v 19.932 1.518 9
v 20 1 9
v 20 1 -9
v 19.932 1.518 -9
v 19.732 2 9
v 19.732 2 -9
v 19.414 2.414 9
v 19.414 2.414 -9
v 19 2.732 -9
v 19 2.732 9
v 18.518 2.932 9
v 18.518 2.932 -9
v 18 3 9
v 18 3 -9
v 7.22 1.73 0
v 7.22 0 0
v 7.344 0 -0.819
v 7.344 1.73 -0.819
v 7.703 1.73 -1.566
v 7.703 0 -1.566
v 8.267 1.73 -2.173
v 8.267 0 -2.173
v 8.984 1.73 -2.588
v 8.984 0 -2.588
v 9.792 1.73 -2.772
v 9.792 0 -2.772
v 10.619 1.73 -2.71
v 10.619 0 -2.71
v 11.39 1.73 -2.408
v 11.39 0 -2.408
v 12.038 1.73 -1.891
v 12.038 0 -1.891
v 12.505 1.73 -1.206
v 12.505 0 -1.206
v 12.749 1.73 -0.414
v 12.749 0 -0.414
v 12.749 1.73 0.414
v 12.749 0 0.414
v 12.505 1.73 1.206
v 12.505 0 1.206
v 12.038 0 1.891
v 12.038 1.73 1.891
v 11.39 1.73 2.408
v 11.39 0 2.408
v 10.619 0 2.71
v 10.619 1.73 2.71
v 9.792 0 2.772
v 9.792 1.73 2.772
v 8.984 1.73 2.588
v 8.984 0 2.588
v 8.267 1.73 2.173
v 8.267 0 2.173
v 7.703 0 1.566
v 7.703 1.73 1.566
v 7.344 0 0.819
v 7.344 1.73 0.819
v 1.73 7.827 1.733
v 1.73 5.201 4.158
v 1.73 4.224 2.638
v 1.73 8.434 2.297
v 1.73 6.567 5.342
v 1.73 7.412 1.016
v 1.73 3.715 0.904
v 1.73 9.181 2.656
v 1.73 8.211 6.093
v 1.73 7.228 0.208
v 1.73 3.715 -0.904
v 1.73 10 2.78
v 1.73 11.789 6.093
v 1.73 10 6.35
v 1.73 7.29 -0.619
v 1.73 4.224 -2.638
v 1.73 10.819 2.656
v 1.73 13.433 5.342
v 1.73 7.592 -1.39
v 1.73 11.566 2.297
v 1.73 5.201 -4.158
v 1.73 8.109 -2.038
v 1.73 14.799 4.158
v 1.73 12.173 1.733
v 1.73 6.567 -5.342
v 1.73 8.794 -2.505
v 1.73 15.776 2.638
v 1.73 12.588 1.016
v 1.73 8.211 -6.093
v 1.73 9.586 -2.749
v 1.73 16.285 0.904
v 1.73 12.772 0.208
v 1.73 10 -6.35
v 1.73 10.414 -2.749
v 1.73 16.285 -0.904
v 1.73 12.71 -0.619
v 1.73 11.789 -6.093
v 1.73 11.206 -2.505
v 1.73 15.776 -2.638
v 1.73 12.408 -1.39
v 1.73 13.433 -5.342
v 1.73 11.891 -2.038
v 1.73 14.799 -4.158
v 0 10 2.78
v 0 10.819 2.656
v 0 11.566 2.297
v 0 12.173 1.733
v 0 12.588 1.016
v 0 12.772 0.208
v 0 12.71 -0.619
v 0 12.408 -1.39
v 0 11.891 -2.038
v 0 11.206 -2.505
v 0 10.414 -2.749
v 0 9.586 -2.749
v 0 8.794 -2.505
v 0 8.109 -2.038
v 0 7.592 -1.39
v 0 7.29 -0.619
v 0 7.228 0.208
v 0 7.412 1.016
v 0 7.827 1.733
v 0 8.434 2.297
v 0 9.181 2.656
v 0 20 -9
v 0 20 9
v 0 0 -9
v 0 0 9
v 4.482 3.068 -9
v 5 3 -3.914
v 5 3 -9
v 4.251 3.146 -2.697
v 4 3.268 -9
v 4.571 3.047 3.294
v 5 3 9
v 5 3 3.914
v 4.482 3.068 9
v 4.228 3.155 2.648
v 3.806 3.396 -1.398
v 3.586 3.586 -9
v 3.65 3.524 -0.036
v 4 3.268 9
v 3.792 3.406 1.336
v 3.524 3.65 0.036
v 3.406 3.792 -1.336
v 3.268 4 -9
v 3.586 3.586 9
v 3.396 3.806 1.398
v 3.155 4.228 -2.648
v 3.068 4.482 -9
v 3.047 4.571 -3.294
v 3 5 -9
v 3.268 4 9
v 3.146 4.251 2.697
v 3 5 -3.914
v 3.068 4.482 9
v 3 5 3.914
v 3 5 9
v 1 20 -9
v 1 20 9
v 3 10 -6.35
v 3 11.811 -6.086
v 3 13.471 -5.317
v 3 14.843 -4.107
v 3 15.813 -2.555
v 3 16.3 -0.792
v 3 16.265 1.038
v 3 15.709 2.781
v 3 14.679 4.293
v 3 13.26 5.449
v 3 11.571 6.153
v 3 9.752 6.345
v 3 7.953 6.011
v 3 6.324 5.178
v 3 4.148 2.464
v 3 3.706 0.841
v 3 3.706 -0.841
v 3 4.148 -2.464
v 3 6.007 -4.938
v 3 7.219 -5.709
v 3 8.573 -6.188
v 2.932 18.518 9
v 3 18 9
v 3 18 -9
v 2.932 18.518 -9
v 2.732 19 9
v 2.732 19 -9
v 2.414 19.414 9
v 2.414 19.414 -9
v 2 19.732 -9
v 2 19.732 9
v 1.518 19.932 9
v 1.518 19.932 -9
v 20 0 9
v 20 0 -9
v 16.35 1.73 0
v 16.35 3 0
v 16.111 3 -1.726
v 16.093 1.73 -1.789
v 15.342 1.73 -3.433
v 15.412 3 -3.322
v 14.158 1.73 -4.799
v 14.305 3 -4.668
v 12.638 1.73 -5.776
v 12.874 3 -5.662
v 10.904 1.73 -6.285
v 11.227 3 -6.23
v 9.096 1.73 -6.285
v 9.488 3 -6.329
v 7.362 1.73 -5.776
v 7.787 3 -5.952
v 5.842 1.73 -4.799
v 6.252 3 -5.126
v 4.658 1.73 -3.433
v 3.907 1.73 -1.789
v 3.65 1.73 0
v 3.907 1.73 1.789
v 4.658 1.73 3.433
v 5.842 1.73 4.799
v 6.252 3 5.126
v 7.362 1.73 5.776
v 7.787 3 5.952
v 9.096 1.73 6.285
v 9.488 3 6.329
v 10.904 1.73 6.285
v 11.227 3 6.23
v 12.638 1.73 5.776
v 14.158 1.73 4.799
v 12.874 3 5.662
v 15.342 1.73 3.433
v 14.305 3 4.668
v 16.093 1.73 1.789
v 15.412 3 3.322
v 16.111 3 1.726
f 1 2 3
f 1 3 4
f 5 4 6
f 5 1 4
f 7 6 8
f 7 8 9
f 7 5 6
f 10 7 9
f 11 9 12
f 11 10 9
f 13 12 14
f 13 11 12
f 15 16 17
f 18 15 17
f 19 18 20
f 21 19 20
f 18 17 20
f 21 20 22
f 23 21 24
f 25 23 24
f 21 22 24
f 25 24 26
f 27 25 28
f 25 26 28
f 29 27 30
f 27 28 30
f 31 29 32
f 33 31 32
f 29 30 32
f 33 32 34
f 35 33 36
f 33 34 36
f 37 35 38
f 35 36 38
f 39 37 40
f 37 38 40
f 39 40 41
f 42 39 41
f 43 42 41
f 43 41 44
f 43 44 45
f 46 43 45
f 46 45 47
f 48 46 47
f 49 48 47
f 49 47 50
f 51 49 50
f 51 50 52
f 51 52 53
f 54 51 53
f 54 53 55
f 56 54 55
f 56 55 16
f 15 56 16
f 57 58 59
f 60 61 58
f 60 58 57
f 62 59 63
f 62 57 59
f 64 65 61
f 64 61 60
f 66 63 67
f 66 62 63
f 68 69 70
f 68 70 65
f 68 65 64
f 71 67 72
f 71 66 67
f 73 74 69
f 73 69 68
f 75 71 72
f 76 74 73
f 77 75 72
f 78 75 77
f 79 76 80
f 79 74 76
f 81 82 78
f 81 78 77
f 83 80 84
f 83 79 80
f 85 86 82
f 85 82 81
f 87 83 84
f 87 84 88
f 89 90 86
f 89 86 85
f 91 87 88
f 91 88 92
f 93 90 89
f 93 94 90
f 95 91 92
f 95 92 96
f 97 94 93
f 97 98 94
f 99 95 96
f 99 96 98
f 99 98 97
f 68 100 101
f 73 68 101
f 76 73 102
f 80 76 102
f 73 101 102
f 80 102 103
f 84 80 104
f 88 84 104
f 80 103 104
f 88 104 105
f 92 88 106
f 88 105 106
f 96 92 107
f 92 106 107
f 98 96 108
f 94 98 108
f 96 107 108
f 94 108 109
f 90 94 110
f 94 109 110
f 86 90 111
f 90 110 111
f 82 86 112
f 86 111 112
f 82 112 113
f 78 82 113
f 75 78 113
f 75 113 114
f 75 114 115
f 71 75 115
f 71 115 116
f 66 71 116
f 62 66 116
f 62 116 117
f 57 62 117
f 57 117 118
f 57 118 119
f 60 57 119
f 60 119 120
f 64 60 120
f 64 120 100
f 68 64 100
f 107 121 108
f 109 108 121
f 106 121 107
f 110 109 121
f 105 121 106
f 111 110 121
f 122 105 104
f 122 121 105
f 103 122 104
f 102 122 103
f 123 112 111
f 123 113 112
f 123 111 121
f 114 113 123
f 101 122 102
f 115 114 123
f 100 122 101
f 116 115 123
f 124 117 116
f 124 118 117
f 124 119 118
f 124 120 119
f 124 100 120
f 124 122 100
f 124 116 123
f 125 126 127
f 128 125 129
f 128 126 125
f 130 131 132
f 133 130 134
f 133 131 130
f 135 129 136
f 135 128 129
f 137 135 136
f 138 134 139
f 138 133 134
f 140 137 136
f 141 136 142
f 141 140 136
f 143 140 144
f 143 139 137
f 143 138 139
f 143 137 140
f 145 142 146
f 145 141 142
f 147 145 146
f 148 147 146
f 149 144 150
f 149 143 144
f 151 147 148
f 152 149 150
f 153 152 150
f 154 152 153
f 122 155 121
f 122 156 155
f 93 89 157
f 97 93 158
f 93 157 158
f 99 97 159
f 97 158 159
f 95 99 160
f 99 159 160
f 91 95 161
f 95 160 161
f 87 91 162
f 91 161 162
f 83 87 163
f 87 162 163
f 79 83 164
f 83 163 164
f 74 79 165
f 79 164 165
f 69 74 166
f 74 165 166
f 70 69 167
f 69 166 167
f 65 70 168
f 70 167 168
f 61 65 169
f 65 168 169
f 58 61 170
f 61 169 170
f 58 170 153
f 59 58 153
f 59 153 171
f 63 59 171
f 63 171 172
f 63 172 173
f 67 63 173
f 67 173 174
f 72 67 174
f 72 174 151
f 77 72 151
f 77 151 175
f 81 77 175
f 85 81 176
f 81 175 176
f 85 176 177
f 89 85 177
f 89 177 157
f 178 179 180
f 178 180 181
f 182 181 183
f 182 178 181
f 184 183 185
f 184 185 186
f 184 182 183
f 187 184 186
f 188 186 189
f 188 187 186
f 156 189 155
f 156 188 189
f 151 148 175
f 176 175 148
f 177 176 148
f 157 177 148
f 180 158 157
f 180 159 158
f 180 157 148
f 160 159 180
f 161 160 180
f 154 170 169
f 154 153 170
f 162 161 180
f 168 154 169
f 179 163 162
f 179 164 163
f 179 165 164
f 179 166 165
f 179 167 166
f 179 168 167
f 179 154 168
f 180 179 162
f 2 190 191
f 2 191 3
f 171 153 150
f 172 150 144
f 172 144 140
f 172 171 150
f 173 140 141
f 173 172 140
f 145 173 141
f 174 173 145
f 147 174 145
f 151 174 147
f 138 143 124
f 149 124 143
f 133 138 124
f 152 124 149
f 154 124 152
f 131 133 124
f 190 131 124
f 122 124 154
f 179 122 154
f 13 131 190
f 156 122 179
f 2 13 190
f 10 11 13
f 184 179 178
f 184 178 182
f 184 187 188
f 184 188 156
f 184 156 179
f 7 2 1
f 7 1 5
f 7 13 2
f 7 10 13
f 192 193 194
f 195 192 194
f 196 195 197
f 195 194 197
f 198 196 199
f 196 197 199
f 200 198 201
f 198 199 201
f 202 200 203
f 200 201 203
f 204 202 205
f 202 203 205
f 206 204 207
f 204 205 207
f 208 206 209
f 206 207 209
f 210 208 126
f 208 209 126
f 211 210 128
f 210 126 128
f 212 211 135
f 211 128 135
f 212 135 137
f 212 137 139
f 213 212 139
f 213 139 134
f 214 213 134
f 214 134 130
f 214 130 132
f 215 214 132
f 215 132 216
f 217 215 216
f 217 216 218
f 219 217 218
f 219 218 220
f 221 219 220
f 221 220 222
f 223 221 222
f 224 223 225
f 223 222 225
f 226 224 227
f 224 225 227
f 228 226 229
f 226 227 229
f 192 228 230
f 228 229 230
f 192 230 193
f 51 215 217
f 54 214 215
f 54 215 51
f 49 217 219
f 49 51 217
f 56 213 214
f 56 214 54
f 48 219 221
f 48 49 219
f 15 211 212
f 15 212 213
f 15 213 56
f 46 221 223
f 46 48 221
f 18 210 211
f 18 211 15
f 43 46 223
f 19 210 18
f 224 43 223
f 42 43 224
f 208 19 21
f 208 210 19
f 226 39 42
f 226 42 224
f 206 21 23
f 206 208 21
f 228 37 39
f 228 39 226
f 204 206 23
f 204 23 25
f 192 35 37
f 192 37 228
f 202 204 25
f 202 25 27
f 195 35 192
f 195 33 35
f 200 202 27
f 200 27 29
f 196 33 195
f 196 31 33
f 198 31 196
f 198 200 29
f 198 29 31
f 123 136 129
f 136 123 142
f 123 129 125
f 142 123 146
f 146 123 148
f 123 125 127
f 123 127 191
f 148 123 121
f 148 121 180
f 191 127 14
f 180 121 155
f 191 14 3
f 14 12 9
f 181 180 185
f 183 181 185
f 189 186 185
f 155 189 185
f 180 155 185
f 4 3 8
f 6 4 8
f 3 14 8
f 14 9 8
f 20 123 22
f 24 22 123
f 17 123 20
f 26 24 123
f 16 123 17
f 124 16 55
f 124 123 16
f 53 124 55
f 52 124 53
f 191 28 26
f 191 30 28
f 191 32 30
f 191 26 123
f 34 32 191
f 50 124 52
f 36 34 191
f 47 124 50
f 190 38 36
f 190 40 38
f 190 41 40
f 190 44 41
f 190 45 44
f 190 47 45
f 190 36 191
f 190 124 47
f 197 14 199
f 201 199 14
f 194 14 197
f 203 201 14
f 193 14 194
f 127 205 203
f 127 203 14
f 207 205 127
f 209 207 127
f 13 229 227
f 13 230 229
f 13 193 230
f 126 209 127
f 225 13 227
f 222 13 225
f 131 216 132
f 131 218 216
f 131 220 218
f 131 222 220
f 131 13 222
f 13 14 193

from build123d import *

# Parameters (mm, degrees)
BOSS_EXTRUDE1_DEPTH     = 9
SKETCH2_R               = 2.78
CUT_EXTRUDE1_DEPTH      = 21
SKETCH3_R               = 2.78
CUT_EXTRUDE2_DEPTH      = 21
SKETCH6_R               = 6.35
CUT_EXTRUDE3_DEPTH      = 18
CUT_EXTRUDE3_DEPTH_BACK = 1.27
SKETCH7_R               = 6.35
CUT_EXTRUDE4_DEPTH      = 18
CUT_EXTRUDE4_DEPTH_BACK = 1.27


with BuildPart() as part:
    # Sketch1 → Boss-Extrude1 (new body, symmetric)
    with BuildSketch(Plane.XY):
        with BuildLine():
            Line((0, 0), (20, 0))
            Line((20, 0), (20, 1))
            ThreePointArc((20, 1), (19.414213562, 2.414213562), (18, 3))
            Line((18, 3), (5, 3))
            ThreePointArc((5, 3), (3.585786438, 3.585786438), (3, 5))
            Line((3, 5), (3, 18))
            ThreePointArc((3, 18), (2.414213562, 19.414213562), (1, 20))
            Line((1, 20), (0, 20))
            Line((0, 20), (0, 0))
        make_face()
    extrude(amount=BOSS_EXTRUDE1_DEPTH, both=True)

    # Sketch2 → Cut-Extrude1 (cut, through all)
    with BuildSketch(Plane(origin=(0, 0, 0), x_dir=(-1, 0, 0), z_dir=(0, -1, 0))):
        with Locations((-10, 0)):
            Circle(SKETCH2_R)
    extrude(amount=-CUT_EXTRUDE1_DEPTH, mode=Mode.SUBTRACT)

    # Sketch3 → Cut-Extrude2 (cut, through all)
    with BuildSketch(Plane.ZY):
        with Locations((0, 10)):
            Circle(SKETCH3_R)
    extrude(amount=-CUT_EXTRUDE2_DEPTH, mode=Mode.SUBTRACT)

    # Sketch6 → Cut-Extrude3 (cut, two sides)
    with BuildSketch(Plane(origin=(3, 0, 0), x_dir=(0, 0, -1), z_dir=(1, 0, 0))) as cut_extrude3_sk:
        with Locations((0, 10)):
            Circle(SKETCH6_R)
    extrude(amount=CUT_EXTRUDE3_DEPTH, mode=Mode.SUBTRACT)
    extrude(cut_extrude3_sk.sketch, amount=-CUT_EXTRUDE3_DEPTH_BACK, mode=Mode.SUBTRACT)

    # Sketch7 → Cut-Extrude4 (cut, two sides)
    with BuildSketch(Plane(origin=(0, 3, 0), x_dir=(1, 0, 0), z_dir=(0, 1, 0))) as cut_extrude4_sk:
        with Locations((10, 0)):
            Circle(SKETCH7_R)
    extrude(amount=CUT_EXTRUDE4_DEPTH, mode=Mode.SUBTRACT)
    extrude(cut_extrude4_sk.sketch, amount=-CUT_EXTRUDE4_DEPTH_BACK, mode=Mode.SUBTRACT)


solid = part.part
